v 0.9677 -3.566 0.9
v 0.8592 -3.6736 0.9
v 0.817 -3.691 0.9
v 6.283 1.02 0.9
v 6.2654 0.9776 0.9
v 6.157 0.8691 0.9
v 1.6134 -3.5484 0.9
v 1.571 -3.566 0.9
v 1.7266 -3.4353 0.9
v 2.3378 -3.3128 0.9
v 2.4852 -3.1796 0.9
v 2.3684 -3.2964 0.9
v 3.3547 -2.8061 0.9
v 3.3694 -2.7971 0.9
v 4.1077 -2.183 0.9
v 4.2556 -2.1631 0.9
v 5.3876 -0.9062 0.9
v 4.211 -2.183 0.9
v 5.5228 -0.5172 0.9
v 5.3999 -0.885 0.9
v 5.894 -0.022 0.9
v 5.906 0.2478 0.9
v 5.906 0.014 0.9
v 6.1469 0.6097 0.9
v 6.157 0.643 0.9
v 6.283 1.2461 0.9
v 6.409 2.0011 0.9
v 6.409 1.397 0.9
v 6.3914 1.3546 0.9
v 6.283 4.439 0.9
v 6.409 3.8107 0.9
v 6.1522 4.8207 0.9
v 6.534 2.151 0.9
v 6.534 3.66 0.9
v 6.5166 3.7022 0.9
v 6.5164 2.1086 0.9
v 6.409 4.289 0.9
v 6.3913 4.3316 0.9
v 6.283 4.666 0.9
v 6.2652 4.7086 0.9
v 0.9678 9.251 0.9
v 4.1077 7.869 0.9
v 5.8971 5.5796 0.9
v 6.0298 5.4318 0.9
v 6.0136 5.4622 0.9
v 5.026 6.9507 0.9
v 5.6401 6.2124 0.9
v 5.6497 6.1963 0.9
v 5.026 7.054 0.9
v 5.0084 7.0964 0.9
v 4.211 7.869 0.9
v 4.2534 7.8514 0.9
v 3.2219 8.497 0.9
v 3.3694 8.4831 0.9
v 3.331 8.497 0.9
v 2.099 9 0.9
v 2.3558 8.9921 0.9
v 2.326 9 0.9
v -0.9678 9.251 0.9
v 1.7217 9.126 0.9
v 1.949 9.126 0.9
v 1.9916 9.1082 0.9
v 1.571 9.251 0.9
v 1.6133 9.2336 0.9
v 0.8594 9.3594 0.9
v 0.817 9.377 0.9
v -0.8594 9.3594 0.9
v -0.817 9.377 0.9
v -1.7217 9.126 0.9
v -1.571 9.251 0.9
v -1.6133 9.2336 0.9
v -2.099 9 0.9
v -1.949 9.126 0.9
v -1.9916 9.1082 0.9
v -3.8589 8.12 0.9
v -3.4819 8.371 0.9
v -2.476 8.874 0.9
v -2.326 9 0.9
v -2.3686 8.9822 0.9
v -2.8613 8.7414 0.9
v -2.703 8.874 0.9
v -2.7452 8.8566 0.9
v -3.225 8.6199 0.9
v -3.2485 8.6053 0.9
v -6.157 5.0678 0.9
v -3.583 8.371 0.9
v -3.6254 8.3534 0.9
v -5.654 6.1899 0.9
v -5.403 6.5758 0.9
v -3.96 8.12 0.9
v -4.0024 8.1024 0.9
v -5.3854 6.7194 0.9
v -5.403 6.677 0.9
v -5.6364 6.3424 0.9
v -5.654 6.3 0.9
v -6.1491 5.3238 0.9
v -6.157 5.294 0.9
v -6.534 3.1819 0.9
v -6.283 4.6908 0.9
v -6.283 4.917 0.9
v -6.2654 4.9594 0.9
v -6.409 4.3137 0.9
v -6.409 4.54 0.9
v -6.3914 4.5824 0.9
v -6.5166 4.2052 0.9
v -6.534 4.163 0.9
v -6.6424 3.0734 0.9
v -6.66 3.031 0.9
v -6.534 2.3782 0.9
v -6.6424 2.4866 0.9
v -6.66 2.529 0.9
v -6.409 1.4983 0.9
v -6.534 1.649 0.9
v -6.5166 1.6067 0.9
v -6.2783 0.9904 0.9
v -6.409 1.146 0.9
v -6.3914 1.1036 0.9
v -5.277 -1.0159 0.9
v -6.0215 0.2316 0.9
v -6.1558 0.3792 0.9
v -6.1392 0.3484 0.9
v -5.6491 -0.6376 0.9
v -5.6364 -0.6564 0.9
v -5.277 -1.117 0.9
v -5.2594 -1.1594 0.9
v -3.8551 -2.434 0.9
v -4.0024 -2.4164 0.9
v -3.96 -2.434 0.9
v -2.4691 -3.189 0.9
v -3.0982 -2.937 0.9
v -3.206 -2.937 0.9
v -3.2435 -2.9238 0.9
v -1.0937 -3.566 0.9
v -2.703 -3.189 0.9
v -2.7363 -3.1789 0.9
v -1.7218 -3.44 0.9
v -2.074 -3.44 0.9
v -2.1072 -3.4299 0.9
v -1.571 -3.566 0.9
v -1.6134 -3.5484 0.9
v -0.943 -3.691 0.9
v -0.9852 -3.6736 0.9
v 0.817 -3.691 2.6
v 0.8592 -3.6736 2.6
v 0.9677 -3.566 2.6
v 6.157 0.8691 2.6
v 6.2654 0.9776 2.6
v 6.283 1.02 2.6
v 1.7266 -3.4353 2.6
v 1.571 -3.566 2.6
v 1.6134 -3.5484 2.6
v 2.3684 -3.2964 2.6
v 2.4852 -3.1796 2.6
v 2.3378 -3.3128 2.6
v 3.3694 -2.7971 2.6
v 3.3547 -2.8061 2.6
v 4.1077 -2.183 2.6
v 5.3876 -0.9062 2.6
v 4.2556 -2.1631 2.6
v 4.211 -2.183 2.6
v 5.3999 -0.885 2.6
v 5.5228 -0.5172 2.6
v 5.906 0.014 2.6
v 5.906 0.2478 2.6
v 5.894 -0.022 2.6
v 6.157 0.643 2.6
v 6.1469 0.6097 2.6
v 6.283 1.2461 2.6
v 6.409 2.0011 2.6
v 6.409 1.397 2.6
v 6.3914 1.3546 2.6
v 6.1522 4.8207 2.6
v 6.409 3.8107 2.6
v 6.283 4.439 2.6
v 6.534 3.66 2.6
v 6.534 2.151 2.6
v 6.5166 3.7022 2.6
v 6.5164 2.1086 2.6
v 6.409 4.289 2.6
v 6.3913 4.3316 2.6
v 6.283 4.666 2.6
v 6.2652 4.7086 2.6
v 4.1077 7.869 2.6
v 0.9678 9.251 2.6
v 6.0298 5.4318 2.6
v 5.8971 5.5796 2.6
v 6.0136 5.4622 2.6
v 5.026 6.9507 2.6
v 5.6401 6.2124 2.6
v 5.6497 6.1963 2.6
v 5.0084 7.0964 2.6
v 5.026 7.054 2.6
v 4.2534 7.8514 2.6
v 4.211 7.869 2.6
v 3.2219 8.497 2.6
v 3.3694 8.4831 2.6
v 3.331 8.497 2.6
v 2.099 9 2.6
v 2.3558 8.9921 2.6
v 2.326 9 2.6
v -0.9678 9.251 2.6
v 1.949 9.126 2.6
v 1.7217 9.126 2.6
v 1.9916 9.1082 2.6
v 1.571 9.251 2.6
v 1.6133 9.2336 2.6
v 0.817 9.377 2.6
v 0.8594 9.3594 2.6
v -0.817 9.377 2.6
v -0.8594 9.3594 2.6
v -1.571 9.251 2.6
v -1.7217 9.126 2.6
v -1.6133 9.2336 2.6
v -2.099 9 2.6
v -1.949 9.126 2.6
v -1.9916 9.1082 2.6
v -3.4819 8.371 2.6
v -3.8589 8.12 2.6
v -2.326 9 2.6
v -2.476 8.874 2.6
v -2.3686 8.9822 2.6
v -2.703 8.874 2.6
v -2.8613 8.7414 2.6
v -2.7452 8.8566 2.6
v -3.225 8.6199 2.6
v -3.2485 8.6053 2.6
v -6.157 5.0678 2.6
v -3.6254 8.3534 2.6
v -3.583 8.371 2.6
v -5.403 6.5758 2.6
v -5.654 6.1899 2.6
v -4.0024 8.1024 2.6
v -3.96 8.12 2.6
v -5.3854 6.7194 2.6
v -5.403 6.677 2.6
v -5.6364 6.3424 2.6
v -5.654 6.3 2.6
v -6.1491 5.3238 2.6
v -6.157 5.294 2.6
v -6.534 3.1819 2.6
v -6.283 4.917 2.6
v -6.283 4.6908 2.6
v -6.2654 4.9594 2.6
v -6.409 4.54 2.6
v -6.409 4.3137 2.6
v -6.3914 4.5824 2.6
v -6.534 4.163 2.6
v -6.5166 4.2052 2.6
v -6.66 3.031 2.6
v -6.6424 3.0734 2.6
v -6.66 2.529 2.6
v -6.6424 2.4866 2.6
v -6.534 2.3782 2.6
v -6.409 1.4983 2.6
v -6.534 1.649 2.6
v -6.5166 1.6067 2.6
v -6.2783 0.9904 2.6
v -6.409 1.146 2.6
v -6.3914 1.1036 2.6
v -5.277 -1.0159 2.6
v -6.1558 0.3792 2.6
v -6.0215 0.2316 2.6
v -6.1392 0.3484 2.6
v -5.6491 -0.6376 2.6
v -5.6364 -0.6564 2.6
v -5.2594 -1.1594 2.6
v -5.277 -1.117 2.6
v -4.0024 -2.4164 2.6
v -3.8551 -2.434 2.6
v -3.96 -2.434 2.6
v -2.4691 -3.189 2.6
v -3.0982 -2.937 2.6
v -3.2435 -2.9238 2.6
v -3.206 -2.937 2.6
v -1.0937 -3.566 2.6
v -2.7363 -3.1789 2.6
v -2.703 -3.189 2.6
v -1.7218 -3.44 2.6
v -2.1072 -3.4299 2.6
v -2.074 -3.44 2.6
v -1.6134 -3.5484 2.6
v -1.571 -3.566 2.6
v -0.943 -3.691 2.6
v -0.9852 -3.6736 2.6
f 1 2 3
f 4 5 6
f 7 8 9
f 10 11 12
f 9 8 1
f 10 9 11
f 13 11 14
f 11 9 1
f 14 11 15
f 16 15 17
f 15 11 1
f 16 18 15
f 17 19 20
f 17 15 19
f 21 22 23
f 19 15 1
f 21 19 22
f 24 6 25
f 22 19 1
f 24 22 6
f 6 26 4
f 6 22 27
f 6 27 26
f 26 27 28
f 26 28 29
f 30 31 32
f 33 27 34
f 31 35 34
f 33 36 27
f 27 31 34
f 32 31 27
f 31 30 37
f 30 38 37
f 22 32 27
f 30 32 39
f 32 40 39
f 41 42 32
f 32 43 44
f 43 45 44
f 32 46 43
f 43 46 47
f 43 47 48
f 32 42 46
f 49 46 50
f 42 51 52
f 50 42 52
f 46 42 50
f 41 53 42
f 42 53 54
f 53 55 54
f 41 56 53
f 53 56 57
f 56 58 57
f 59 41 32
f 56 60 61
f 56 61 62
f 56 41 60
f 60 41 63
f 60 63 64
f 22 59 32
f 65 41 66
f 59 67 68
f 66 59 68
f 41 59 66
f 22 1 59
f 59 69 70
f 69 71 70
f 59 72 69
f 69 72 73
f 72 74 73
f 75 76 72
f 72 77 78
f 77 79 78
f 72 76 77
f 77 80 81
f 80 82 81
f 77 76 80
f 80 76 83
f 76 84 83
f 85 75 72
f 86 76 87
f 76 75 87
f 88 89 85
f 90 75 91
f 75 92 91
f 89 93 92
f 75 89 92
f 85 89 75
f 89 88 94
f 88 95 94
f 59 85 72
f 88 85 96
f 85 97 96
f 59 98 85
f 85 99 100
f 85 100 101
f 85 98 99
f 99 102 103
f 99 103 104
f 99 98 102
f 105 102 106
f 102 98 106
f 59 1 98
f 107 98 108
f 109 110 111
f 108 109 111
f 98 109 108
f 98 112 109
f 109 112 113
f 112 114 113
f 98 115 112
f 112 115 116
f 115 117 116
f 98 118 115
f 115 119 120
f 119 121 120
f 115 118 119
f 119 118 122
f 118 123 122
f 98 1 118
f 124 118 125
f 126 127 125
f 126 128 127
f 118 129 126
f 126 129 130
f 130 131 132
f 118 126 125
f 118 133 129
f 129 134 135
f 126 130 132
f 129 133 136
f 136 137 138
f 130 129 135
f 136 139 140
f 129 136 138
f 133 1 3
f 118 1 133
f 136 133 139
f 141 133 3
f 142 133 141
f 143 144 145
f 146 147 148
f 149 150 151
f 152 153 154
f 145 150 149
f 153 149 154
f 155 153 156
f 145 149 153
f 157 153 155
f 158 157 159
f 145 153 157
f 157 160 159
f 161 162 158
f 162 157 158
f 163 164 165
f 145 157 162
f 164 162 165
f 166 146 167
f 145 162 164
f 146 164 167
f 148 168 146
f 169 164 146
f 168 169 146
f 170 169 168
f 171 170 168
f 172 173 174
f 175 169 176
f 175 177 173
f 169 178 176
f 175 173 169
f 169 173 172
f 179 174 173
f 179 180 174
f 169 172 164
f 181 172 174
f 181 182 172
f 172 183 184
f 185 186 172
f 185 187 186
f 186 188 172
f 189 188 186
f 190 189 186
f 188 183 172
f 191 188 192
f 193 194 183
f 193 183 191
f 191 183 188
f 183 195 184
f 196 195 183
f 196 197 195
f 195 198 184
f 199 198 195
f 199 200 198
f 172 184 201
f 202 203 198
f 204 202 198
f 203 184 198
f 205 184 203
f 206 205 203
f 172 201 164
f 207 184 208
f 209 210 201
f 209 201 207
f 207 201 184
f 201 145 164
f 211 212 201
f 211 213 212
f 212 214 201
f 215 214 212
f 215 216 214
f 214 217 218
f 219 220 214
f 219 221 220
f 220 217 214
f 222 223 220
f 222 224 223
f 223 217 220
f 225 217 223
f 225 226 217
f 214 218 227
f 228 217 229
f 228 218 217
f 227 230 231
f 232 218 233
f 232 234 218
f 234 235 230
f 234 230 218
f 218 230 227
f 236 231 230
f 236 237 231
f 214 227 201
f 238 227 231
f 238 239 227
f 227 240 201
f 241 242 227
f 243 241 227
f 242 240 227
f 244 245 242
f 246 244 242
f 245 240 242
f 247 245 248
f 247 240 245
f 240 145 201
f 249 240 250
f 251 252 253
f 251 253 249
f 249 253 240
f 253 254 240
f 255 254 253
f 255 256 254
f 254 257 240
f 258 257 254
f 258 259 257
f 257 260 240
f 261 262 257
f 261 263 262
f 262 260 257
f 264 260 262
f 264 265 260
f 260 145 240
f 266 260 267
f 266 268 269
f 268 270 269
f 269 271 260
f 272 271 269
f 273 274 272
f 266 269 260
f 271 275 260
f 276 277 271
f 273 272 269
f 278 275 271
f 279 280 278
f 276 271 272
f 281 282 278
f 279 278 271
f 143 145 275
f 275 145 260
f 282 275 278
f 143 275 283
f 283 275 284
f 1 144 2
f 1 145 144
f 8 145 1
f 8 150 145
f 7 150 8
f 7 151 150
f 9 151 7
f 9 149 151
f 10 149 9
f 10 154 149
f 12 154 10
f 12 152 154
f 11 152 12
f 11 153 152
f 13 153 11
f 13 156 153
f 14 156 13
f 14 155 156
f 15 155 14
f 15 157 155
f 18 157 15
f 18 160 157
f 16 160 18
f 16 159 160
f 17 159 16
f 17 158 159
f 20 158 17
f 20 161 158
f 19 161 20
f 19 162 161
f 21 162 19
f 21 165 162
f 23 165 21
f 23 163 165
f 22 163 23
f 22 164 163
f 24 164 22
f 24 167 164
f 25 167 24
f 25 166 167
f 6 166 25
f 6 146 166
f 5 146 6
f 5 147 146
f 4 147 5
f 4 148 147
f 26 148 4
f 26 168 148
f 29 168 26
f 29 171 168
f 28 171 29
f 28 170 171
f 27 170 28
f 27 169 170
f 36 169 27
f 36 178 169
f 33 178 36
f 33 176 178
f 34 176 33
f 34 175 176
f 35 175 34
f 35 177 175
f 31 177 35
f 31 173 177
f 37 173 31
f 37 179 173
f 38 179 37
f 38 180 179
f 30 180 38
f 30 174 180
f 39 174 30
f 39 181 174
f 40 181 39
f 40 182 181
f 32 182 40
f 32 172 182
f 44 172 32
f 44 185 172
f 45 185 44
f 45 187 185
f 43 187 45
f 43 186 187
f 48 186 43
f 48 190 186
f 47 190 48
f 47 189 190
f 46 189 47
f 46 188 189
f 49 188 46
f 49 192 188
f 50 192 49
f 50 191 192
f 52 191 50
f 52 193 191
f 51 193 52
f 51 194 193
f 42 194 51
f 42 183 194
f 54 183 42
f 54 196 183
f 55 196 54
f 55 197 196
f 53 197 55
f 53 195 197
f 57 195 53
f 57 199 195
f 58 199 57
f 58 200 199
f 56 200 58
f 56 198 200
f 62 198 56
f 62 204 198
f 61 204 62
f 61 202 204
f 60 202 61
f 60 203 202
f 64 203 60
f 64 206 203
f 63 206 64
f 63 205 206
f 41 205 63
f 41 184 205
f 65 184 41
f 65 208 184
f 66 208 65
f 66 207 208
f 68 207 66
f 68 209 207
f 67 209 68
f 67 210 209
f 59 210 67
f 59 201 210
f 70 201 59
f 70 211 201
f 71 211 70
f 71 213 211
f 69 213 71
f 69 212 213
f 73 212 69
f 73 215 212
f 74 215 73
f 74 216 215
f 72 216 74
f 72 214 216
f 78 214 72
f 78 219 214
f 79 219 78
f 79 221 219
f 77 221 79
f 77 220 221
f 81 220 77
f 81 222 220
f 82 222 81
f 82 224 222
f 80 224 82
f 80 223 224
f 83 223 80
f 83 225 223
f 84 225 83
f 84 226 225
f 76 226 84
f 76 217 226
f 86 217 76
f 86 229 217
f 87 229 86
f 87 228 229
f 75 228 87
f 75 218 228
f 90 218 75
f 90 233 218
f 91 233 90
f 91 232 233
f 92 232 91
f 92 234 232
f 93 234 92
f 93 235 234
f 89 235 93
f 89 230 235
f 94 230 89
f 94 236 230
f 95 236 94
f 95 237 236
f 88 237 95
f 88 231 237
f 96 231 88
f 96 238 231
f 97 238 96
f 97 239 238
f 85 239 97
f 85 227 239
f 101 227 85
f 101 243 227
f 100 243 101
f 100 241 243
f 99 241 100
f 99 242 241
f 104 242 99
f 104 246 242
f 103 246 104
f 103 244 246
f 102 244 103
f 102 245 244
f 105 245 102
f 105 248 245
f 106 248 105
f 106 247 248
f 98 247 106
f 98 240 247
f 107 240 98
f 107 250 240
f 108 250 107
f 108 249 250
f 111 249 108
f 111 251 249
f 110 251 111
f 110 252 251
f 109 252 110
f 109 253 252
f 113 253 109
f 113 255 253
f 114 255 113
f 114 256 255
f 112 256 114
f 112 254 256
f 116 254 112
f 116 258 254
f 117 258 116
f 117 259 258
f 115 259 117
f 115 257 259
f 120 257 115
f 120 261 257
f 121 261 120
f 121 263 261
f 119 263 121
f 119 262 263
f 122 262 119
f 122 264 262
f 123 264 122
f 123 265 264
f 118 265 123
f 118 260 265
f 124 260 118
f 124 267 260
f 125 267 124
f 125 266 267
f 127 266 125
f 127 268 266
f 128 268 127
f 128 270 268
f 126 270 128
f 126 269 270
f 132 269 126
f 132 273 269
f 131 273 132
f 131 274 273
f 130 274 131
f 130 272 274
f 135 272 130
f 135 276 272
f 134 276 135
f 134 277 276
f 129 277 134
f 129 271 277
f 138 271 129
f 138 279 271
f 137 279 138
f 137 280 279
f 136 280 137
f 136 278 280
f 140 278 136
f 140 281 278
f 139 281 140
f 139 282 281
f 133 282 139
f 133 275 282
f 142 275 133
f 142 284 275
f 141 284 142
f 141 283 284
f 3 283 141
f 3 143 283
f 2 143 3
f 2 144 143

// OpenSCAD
$fn = 24;
translate([0, -2.500, 0.900])
  linear_extrude(height=1.700) {
offset(r=0.06, $fn=8) {
    polygon(points=[[-0.817,11.817],[-0.943,11.691],[-1.571,11.691],[-1.697,11.566],[-1.949,11.566],[-2.074,11.440],[-2.326,11.440],[-2.451,11.314],[-2.703,11.314],[-2.829,11.189],[-3.206,11.063],[-3.457,10.811],[-3.583,10.811],[-3.834,10.560],[-3.960,10.560],[-5.343,9.177],[-5.343,9.051],[-5.594,8.800],[-5.594,8.674],[-6.097,7.794],[-6.097,7.543],[-6.223,7.417],[-6.223,7.166],[-6.349,7.040],[-6.349,6.789],[-6.474,6.663],[-6.474,5.657],[-6.600,5.531],[-6.600,5.029],[-6.474,4.903],[-6.474,4.149],[-6.349,4.023],[-6.349,3.646],[-6.223,3.520],[-6.097,2.891],[-5.971,2.766],[-5.594,1.886],[-5.217,1.509],[-5.217,1.383],[-3.960,0.126],[-3.834,0.126],[-3.206,-0.377],[-3.080,-0.377],[-2.703,-0.629],[-2.451,-0.629],[-2.074,-0.880],[-1.697,-0.880],[-1.571,-1.006],[-1.069,-1.006],[-0.943,-1.131],[0.817,-1.131],[0.943,-1.006],[1.571,-1.006],[1.697,-0.880],[2.326,-0.754],[2.451,-0.629],[3.331,-0.251],[4.086,0.377],[4.211,0.377],[5.343,1.634],[5.469,2.011],[5.846,2.514],[5.846,2.766],[6.097,3.143],[6.097,3.394],[6.223,3.520],[6.223,3.771],[6.349,3.897],[6.349,4.526],[6.474,4.651],[6.474,6.160],[6.349,6.286],[6.349,6.789],[6.223,6.914],[6.223,7.166],[6.097,7.291],[5.971,7.920],[5.846,8.046],[5.594,8.674],[4.966,9.429],[4.966,9.554],[4.211,10.309],[4.086,10.309],[3.331,10.937],[3.206,10.937],[2.326,11.440],[2.074,11.440],[1.949,11.566],[1.697,11.566],[1.571,11.691],[0.943,11.691],[0.817,11.817]], paths=[[0,1,2,3,4,5,6,7,8,9,10,11,12,13,14,15,16,17,18,19,20,21,22,23,24,25,26,27,28,29,30,31,32,33,34,35,36,37,38,39,40,41,42,43,44,45,46,47,48,49,50,51,52,53,54,55,56,57,58,59,60,61,62,63,64,65,66,67,68,69,70,71,72,73,74,75,76,77,78,79,80,81,82,83,84,85,86,87,88,89,90,91]]);
}
}
